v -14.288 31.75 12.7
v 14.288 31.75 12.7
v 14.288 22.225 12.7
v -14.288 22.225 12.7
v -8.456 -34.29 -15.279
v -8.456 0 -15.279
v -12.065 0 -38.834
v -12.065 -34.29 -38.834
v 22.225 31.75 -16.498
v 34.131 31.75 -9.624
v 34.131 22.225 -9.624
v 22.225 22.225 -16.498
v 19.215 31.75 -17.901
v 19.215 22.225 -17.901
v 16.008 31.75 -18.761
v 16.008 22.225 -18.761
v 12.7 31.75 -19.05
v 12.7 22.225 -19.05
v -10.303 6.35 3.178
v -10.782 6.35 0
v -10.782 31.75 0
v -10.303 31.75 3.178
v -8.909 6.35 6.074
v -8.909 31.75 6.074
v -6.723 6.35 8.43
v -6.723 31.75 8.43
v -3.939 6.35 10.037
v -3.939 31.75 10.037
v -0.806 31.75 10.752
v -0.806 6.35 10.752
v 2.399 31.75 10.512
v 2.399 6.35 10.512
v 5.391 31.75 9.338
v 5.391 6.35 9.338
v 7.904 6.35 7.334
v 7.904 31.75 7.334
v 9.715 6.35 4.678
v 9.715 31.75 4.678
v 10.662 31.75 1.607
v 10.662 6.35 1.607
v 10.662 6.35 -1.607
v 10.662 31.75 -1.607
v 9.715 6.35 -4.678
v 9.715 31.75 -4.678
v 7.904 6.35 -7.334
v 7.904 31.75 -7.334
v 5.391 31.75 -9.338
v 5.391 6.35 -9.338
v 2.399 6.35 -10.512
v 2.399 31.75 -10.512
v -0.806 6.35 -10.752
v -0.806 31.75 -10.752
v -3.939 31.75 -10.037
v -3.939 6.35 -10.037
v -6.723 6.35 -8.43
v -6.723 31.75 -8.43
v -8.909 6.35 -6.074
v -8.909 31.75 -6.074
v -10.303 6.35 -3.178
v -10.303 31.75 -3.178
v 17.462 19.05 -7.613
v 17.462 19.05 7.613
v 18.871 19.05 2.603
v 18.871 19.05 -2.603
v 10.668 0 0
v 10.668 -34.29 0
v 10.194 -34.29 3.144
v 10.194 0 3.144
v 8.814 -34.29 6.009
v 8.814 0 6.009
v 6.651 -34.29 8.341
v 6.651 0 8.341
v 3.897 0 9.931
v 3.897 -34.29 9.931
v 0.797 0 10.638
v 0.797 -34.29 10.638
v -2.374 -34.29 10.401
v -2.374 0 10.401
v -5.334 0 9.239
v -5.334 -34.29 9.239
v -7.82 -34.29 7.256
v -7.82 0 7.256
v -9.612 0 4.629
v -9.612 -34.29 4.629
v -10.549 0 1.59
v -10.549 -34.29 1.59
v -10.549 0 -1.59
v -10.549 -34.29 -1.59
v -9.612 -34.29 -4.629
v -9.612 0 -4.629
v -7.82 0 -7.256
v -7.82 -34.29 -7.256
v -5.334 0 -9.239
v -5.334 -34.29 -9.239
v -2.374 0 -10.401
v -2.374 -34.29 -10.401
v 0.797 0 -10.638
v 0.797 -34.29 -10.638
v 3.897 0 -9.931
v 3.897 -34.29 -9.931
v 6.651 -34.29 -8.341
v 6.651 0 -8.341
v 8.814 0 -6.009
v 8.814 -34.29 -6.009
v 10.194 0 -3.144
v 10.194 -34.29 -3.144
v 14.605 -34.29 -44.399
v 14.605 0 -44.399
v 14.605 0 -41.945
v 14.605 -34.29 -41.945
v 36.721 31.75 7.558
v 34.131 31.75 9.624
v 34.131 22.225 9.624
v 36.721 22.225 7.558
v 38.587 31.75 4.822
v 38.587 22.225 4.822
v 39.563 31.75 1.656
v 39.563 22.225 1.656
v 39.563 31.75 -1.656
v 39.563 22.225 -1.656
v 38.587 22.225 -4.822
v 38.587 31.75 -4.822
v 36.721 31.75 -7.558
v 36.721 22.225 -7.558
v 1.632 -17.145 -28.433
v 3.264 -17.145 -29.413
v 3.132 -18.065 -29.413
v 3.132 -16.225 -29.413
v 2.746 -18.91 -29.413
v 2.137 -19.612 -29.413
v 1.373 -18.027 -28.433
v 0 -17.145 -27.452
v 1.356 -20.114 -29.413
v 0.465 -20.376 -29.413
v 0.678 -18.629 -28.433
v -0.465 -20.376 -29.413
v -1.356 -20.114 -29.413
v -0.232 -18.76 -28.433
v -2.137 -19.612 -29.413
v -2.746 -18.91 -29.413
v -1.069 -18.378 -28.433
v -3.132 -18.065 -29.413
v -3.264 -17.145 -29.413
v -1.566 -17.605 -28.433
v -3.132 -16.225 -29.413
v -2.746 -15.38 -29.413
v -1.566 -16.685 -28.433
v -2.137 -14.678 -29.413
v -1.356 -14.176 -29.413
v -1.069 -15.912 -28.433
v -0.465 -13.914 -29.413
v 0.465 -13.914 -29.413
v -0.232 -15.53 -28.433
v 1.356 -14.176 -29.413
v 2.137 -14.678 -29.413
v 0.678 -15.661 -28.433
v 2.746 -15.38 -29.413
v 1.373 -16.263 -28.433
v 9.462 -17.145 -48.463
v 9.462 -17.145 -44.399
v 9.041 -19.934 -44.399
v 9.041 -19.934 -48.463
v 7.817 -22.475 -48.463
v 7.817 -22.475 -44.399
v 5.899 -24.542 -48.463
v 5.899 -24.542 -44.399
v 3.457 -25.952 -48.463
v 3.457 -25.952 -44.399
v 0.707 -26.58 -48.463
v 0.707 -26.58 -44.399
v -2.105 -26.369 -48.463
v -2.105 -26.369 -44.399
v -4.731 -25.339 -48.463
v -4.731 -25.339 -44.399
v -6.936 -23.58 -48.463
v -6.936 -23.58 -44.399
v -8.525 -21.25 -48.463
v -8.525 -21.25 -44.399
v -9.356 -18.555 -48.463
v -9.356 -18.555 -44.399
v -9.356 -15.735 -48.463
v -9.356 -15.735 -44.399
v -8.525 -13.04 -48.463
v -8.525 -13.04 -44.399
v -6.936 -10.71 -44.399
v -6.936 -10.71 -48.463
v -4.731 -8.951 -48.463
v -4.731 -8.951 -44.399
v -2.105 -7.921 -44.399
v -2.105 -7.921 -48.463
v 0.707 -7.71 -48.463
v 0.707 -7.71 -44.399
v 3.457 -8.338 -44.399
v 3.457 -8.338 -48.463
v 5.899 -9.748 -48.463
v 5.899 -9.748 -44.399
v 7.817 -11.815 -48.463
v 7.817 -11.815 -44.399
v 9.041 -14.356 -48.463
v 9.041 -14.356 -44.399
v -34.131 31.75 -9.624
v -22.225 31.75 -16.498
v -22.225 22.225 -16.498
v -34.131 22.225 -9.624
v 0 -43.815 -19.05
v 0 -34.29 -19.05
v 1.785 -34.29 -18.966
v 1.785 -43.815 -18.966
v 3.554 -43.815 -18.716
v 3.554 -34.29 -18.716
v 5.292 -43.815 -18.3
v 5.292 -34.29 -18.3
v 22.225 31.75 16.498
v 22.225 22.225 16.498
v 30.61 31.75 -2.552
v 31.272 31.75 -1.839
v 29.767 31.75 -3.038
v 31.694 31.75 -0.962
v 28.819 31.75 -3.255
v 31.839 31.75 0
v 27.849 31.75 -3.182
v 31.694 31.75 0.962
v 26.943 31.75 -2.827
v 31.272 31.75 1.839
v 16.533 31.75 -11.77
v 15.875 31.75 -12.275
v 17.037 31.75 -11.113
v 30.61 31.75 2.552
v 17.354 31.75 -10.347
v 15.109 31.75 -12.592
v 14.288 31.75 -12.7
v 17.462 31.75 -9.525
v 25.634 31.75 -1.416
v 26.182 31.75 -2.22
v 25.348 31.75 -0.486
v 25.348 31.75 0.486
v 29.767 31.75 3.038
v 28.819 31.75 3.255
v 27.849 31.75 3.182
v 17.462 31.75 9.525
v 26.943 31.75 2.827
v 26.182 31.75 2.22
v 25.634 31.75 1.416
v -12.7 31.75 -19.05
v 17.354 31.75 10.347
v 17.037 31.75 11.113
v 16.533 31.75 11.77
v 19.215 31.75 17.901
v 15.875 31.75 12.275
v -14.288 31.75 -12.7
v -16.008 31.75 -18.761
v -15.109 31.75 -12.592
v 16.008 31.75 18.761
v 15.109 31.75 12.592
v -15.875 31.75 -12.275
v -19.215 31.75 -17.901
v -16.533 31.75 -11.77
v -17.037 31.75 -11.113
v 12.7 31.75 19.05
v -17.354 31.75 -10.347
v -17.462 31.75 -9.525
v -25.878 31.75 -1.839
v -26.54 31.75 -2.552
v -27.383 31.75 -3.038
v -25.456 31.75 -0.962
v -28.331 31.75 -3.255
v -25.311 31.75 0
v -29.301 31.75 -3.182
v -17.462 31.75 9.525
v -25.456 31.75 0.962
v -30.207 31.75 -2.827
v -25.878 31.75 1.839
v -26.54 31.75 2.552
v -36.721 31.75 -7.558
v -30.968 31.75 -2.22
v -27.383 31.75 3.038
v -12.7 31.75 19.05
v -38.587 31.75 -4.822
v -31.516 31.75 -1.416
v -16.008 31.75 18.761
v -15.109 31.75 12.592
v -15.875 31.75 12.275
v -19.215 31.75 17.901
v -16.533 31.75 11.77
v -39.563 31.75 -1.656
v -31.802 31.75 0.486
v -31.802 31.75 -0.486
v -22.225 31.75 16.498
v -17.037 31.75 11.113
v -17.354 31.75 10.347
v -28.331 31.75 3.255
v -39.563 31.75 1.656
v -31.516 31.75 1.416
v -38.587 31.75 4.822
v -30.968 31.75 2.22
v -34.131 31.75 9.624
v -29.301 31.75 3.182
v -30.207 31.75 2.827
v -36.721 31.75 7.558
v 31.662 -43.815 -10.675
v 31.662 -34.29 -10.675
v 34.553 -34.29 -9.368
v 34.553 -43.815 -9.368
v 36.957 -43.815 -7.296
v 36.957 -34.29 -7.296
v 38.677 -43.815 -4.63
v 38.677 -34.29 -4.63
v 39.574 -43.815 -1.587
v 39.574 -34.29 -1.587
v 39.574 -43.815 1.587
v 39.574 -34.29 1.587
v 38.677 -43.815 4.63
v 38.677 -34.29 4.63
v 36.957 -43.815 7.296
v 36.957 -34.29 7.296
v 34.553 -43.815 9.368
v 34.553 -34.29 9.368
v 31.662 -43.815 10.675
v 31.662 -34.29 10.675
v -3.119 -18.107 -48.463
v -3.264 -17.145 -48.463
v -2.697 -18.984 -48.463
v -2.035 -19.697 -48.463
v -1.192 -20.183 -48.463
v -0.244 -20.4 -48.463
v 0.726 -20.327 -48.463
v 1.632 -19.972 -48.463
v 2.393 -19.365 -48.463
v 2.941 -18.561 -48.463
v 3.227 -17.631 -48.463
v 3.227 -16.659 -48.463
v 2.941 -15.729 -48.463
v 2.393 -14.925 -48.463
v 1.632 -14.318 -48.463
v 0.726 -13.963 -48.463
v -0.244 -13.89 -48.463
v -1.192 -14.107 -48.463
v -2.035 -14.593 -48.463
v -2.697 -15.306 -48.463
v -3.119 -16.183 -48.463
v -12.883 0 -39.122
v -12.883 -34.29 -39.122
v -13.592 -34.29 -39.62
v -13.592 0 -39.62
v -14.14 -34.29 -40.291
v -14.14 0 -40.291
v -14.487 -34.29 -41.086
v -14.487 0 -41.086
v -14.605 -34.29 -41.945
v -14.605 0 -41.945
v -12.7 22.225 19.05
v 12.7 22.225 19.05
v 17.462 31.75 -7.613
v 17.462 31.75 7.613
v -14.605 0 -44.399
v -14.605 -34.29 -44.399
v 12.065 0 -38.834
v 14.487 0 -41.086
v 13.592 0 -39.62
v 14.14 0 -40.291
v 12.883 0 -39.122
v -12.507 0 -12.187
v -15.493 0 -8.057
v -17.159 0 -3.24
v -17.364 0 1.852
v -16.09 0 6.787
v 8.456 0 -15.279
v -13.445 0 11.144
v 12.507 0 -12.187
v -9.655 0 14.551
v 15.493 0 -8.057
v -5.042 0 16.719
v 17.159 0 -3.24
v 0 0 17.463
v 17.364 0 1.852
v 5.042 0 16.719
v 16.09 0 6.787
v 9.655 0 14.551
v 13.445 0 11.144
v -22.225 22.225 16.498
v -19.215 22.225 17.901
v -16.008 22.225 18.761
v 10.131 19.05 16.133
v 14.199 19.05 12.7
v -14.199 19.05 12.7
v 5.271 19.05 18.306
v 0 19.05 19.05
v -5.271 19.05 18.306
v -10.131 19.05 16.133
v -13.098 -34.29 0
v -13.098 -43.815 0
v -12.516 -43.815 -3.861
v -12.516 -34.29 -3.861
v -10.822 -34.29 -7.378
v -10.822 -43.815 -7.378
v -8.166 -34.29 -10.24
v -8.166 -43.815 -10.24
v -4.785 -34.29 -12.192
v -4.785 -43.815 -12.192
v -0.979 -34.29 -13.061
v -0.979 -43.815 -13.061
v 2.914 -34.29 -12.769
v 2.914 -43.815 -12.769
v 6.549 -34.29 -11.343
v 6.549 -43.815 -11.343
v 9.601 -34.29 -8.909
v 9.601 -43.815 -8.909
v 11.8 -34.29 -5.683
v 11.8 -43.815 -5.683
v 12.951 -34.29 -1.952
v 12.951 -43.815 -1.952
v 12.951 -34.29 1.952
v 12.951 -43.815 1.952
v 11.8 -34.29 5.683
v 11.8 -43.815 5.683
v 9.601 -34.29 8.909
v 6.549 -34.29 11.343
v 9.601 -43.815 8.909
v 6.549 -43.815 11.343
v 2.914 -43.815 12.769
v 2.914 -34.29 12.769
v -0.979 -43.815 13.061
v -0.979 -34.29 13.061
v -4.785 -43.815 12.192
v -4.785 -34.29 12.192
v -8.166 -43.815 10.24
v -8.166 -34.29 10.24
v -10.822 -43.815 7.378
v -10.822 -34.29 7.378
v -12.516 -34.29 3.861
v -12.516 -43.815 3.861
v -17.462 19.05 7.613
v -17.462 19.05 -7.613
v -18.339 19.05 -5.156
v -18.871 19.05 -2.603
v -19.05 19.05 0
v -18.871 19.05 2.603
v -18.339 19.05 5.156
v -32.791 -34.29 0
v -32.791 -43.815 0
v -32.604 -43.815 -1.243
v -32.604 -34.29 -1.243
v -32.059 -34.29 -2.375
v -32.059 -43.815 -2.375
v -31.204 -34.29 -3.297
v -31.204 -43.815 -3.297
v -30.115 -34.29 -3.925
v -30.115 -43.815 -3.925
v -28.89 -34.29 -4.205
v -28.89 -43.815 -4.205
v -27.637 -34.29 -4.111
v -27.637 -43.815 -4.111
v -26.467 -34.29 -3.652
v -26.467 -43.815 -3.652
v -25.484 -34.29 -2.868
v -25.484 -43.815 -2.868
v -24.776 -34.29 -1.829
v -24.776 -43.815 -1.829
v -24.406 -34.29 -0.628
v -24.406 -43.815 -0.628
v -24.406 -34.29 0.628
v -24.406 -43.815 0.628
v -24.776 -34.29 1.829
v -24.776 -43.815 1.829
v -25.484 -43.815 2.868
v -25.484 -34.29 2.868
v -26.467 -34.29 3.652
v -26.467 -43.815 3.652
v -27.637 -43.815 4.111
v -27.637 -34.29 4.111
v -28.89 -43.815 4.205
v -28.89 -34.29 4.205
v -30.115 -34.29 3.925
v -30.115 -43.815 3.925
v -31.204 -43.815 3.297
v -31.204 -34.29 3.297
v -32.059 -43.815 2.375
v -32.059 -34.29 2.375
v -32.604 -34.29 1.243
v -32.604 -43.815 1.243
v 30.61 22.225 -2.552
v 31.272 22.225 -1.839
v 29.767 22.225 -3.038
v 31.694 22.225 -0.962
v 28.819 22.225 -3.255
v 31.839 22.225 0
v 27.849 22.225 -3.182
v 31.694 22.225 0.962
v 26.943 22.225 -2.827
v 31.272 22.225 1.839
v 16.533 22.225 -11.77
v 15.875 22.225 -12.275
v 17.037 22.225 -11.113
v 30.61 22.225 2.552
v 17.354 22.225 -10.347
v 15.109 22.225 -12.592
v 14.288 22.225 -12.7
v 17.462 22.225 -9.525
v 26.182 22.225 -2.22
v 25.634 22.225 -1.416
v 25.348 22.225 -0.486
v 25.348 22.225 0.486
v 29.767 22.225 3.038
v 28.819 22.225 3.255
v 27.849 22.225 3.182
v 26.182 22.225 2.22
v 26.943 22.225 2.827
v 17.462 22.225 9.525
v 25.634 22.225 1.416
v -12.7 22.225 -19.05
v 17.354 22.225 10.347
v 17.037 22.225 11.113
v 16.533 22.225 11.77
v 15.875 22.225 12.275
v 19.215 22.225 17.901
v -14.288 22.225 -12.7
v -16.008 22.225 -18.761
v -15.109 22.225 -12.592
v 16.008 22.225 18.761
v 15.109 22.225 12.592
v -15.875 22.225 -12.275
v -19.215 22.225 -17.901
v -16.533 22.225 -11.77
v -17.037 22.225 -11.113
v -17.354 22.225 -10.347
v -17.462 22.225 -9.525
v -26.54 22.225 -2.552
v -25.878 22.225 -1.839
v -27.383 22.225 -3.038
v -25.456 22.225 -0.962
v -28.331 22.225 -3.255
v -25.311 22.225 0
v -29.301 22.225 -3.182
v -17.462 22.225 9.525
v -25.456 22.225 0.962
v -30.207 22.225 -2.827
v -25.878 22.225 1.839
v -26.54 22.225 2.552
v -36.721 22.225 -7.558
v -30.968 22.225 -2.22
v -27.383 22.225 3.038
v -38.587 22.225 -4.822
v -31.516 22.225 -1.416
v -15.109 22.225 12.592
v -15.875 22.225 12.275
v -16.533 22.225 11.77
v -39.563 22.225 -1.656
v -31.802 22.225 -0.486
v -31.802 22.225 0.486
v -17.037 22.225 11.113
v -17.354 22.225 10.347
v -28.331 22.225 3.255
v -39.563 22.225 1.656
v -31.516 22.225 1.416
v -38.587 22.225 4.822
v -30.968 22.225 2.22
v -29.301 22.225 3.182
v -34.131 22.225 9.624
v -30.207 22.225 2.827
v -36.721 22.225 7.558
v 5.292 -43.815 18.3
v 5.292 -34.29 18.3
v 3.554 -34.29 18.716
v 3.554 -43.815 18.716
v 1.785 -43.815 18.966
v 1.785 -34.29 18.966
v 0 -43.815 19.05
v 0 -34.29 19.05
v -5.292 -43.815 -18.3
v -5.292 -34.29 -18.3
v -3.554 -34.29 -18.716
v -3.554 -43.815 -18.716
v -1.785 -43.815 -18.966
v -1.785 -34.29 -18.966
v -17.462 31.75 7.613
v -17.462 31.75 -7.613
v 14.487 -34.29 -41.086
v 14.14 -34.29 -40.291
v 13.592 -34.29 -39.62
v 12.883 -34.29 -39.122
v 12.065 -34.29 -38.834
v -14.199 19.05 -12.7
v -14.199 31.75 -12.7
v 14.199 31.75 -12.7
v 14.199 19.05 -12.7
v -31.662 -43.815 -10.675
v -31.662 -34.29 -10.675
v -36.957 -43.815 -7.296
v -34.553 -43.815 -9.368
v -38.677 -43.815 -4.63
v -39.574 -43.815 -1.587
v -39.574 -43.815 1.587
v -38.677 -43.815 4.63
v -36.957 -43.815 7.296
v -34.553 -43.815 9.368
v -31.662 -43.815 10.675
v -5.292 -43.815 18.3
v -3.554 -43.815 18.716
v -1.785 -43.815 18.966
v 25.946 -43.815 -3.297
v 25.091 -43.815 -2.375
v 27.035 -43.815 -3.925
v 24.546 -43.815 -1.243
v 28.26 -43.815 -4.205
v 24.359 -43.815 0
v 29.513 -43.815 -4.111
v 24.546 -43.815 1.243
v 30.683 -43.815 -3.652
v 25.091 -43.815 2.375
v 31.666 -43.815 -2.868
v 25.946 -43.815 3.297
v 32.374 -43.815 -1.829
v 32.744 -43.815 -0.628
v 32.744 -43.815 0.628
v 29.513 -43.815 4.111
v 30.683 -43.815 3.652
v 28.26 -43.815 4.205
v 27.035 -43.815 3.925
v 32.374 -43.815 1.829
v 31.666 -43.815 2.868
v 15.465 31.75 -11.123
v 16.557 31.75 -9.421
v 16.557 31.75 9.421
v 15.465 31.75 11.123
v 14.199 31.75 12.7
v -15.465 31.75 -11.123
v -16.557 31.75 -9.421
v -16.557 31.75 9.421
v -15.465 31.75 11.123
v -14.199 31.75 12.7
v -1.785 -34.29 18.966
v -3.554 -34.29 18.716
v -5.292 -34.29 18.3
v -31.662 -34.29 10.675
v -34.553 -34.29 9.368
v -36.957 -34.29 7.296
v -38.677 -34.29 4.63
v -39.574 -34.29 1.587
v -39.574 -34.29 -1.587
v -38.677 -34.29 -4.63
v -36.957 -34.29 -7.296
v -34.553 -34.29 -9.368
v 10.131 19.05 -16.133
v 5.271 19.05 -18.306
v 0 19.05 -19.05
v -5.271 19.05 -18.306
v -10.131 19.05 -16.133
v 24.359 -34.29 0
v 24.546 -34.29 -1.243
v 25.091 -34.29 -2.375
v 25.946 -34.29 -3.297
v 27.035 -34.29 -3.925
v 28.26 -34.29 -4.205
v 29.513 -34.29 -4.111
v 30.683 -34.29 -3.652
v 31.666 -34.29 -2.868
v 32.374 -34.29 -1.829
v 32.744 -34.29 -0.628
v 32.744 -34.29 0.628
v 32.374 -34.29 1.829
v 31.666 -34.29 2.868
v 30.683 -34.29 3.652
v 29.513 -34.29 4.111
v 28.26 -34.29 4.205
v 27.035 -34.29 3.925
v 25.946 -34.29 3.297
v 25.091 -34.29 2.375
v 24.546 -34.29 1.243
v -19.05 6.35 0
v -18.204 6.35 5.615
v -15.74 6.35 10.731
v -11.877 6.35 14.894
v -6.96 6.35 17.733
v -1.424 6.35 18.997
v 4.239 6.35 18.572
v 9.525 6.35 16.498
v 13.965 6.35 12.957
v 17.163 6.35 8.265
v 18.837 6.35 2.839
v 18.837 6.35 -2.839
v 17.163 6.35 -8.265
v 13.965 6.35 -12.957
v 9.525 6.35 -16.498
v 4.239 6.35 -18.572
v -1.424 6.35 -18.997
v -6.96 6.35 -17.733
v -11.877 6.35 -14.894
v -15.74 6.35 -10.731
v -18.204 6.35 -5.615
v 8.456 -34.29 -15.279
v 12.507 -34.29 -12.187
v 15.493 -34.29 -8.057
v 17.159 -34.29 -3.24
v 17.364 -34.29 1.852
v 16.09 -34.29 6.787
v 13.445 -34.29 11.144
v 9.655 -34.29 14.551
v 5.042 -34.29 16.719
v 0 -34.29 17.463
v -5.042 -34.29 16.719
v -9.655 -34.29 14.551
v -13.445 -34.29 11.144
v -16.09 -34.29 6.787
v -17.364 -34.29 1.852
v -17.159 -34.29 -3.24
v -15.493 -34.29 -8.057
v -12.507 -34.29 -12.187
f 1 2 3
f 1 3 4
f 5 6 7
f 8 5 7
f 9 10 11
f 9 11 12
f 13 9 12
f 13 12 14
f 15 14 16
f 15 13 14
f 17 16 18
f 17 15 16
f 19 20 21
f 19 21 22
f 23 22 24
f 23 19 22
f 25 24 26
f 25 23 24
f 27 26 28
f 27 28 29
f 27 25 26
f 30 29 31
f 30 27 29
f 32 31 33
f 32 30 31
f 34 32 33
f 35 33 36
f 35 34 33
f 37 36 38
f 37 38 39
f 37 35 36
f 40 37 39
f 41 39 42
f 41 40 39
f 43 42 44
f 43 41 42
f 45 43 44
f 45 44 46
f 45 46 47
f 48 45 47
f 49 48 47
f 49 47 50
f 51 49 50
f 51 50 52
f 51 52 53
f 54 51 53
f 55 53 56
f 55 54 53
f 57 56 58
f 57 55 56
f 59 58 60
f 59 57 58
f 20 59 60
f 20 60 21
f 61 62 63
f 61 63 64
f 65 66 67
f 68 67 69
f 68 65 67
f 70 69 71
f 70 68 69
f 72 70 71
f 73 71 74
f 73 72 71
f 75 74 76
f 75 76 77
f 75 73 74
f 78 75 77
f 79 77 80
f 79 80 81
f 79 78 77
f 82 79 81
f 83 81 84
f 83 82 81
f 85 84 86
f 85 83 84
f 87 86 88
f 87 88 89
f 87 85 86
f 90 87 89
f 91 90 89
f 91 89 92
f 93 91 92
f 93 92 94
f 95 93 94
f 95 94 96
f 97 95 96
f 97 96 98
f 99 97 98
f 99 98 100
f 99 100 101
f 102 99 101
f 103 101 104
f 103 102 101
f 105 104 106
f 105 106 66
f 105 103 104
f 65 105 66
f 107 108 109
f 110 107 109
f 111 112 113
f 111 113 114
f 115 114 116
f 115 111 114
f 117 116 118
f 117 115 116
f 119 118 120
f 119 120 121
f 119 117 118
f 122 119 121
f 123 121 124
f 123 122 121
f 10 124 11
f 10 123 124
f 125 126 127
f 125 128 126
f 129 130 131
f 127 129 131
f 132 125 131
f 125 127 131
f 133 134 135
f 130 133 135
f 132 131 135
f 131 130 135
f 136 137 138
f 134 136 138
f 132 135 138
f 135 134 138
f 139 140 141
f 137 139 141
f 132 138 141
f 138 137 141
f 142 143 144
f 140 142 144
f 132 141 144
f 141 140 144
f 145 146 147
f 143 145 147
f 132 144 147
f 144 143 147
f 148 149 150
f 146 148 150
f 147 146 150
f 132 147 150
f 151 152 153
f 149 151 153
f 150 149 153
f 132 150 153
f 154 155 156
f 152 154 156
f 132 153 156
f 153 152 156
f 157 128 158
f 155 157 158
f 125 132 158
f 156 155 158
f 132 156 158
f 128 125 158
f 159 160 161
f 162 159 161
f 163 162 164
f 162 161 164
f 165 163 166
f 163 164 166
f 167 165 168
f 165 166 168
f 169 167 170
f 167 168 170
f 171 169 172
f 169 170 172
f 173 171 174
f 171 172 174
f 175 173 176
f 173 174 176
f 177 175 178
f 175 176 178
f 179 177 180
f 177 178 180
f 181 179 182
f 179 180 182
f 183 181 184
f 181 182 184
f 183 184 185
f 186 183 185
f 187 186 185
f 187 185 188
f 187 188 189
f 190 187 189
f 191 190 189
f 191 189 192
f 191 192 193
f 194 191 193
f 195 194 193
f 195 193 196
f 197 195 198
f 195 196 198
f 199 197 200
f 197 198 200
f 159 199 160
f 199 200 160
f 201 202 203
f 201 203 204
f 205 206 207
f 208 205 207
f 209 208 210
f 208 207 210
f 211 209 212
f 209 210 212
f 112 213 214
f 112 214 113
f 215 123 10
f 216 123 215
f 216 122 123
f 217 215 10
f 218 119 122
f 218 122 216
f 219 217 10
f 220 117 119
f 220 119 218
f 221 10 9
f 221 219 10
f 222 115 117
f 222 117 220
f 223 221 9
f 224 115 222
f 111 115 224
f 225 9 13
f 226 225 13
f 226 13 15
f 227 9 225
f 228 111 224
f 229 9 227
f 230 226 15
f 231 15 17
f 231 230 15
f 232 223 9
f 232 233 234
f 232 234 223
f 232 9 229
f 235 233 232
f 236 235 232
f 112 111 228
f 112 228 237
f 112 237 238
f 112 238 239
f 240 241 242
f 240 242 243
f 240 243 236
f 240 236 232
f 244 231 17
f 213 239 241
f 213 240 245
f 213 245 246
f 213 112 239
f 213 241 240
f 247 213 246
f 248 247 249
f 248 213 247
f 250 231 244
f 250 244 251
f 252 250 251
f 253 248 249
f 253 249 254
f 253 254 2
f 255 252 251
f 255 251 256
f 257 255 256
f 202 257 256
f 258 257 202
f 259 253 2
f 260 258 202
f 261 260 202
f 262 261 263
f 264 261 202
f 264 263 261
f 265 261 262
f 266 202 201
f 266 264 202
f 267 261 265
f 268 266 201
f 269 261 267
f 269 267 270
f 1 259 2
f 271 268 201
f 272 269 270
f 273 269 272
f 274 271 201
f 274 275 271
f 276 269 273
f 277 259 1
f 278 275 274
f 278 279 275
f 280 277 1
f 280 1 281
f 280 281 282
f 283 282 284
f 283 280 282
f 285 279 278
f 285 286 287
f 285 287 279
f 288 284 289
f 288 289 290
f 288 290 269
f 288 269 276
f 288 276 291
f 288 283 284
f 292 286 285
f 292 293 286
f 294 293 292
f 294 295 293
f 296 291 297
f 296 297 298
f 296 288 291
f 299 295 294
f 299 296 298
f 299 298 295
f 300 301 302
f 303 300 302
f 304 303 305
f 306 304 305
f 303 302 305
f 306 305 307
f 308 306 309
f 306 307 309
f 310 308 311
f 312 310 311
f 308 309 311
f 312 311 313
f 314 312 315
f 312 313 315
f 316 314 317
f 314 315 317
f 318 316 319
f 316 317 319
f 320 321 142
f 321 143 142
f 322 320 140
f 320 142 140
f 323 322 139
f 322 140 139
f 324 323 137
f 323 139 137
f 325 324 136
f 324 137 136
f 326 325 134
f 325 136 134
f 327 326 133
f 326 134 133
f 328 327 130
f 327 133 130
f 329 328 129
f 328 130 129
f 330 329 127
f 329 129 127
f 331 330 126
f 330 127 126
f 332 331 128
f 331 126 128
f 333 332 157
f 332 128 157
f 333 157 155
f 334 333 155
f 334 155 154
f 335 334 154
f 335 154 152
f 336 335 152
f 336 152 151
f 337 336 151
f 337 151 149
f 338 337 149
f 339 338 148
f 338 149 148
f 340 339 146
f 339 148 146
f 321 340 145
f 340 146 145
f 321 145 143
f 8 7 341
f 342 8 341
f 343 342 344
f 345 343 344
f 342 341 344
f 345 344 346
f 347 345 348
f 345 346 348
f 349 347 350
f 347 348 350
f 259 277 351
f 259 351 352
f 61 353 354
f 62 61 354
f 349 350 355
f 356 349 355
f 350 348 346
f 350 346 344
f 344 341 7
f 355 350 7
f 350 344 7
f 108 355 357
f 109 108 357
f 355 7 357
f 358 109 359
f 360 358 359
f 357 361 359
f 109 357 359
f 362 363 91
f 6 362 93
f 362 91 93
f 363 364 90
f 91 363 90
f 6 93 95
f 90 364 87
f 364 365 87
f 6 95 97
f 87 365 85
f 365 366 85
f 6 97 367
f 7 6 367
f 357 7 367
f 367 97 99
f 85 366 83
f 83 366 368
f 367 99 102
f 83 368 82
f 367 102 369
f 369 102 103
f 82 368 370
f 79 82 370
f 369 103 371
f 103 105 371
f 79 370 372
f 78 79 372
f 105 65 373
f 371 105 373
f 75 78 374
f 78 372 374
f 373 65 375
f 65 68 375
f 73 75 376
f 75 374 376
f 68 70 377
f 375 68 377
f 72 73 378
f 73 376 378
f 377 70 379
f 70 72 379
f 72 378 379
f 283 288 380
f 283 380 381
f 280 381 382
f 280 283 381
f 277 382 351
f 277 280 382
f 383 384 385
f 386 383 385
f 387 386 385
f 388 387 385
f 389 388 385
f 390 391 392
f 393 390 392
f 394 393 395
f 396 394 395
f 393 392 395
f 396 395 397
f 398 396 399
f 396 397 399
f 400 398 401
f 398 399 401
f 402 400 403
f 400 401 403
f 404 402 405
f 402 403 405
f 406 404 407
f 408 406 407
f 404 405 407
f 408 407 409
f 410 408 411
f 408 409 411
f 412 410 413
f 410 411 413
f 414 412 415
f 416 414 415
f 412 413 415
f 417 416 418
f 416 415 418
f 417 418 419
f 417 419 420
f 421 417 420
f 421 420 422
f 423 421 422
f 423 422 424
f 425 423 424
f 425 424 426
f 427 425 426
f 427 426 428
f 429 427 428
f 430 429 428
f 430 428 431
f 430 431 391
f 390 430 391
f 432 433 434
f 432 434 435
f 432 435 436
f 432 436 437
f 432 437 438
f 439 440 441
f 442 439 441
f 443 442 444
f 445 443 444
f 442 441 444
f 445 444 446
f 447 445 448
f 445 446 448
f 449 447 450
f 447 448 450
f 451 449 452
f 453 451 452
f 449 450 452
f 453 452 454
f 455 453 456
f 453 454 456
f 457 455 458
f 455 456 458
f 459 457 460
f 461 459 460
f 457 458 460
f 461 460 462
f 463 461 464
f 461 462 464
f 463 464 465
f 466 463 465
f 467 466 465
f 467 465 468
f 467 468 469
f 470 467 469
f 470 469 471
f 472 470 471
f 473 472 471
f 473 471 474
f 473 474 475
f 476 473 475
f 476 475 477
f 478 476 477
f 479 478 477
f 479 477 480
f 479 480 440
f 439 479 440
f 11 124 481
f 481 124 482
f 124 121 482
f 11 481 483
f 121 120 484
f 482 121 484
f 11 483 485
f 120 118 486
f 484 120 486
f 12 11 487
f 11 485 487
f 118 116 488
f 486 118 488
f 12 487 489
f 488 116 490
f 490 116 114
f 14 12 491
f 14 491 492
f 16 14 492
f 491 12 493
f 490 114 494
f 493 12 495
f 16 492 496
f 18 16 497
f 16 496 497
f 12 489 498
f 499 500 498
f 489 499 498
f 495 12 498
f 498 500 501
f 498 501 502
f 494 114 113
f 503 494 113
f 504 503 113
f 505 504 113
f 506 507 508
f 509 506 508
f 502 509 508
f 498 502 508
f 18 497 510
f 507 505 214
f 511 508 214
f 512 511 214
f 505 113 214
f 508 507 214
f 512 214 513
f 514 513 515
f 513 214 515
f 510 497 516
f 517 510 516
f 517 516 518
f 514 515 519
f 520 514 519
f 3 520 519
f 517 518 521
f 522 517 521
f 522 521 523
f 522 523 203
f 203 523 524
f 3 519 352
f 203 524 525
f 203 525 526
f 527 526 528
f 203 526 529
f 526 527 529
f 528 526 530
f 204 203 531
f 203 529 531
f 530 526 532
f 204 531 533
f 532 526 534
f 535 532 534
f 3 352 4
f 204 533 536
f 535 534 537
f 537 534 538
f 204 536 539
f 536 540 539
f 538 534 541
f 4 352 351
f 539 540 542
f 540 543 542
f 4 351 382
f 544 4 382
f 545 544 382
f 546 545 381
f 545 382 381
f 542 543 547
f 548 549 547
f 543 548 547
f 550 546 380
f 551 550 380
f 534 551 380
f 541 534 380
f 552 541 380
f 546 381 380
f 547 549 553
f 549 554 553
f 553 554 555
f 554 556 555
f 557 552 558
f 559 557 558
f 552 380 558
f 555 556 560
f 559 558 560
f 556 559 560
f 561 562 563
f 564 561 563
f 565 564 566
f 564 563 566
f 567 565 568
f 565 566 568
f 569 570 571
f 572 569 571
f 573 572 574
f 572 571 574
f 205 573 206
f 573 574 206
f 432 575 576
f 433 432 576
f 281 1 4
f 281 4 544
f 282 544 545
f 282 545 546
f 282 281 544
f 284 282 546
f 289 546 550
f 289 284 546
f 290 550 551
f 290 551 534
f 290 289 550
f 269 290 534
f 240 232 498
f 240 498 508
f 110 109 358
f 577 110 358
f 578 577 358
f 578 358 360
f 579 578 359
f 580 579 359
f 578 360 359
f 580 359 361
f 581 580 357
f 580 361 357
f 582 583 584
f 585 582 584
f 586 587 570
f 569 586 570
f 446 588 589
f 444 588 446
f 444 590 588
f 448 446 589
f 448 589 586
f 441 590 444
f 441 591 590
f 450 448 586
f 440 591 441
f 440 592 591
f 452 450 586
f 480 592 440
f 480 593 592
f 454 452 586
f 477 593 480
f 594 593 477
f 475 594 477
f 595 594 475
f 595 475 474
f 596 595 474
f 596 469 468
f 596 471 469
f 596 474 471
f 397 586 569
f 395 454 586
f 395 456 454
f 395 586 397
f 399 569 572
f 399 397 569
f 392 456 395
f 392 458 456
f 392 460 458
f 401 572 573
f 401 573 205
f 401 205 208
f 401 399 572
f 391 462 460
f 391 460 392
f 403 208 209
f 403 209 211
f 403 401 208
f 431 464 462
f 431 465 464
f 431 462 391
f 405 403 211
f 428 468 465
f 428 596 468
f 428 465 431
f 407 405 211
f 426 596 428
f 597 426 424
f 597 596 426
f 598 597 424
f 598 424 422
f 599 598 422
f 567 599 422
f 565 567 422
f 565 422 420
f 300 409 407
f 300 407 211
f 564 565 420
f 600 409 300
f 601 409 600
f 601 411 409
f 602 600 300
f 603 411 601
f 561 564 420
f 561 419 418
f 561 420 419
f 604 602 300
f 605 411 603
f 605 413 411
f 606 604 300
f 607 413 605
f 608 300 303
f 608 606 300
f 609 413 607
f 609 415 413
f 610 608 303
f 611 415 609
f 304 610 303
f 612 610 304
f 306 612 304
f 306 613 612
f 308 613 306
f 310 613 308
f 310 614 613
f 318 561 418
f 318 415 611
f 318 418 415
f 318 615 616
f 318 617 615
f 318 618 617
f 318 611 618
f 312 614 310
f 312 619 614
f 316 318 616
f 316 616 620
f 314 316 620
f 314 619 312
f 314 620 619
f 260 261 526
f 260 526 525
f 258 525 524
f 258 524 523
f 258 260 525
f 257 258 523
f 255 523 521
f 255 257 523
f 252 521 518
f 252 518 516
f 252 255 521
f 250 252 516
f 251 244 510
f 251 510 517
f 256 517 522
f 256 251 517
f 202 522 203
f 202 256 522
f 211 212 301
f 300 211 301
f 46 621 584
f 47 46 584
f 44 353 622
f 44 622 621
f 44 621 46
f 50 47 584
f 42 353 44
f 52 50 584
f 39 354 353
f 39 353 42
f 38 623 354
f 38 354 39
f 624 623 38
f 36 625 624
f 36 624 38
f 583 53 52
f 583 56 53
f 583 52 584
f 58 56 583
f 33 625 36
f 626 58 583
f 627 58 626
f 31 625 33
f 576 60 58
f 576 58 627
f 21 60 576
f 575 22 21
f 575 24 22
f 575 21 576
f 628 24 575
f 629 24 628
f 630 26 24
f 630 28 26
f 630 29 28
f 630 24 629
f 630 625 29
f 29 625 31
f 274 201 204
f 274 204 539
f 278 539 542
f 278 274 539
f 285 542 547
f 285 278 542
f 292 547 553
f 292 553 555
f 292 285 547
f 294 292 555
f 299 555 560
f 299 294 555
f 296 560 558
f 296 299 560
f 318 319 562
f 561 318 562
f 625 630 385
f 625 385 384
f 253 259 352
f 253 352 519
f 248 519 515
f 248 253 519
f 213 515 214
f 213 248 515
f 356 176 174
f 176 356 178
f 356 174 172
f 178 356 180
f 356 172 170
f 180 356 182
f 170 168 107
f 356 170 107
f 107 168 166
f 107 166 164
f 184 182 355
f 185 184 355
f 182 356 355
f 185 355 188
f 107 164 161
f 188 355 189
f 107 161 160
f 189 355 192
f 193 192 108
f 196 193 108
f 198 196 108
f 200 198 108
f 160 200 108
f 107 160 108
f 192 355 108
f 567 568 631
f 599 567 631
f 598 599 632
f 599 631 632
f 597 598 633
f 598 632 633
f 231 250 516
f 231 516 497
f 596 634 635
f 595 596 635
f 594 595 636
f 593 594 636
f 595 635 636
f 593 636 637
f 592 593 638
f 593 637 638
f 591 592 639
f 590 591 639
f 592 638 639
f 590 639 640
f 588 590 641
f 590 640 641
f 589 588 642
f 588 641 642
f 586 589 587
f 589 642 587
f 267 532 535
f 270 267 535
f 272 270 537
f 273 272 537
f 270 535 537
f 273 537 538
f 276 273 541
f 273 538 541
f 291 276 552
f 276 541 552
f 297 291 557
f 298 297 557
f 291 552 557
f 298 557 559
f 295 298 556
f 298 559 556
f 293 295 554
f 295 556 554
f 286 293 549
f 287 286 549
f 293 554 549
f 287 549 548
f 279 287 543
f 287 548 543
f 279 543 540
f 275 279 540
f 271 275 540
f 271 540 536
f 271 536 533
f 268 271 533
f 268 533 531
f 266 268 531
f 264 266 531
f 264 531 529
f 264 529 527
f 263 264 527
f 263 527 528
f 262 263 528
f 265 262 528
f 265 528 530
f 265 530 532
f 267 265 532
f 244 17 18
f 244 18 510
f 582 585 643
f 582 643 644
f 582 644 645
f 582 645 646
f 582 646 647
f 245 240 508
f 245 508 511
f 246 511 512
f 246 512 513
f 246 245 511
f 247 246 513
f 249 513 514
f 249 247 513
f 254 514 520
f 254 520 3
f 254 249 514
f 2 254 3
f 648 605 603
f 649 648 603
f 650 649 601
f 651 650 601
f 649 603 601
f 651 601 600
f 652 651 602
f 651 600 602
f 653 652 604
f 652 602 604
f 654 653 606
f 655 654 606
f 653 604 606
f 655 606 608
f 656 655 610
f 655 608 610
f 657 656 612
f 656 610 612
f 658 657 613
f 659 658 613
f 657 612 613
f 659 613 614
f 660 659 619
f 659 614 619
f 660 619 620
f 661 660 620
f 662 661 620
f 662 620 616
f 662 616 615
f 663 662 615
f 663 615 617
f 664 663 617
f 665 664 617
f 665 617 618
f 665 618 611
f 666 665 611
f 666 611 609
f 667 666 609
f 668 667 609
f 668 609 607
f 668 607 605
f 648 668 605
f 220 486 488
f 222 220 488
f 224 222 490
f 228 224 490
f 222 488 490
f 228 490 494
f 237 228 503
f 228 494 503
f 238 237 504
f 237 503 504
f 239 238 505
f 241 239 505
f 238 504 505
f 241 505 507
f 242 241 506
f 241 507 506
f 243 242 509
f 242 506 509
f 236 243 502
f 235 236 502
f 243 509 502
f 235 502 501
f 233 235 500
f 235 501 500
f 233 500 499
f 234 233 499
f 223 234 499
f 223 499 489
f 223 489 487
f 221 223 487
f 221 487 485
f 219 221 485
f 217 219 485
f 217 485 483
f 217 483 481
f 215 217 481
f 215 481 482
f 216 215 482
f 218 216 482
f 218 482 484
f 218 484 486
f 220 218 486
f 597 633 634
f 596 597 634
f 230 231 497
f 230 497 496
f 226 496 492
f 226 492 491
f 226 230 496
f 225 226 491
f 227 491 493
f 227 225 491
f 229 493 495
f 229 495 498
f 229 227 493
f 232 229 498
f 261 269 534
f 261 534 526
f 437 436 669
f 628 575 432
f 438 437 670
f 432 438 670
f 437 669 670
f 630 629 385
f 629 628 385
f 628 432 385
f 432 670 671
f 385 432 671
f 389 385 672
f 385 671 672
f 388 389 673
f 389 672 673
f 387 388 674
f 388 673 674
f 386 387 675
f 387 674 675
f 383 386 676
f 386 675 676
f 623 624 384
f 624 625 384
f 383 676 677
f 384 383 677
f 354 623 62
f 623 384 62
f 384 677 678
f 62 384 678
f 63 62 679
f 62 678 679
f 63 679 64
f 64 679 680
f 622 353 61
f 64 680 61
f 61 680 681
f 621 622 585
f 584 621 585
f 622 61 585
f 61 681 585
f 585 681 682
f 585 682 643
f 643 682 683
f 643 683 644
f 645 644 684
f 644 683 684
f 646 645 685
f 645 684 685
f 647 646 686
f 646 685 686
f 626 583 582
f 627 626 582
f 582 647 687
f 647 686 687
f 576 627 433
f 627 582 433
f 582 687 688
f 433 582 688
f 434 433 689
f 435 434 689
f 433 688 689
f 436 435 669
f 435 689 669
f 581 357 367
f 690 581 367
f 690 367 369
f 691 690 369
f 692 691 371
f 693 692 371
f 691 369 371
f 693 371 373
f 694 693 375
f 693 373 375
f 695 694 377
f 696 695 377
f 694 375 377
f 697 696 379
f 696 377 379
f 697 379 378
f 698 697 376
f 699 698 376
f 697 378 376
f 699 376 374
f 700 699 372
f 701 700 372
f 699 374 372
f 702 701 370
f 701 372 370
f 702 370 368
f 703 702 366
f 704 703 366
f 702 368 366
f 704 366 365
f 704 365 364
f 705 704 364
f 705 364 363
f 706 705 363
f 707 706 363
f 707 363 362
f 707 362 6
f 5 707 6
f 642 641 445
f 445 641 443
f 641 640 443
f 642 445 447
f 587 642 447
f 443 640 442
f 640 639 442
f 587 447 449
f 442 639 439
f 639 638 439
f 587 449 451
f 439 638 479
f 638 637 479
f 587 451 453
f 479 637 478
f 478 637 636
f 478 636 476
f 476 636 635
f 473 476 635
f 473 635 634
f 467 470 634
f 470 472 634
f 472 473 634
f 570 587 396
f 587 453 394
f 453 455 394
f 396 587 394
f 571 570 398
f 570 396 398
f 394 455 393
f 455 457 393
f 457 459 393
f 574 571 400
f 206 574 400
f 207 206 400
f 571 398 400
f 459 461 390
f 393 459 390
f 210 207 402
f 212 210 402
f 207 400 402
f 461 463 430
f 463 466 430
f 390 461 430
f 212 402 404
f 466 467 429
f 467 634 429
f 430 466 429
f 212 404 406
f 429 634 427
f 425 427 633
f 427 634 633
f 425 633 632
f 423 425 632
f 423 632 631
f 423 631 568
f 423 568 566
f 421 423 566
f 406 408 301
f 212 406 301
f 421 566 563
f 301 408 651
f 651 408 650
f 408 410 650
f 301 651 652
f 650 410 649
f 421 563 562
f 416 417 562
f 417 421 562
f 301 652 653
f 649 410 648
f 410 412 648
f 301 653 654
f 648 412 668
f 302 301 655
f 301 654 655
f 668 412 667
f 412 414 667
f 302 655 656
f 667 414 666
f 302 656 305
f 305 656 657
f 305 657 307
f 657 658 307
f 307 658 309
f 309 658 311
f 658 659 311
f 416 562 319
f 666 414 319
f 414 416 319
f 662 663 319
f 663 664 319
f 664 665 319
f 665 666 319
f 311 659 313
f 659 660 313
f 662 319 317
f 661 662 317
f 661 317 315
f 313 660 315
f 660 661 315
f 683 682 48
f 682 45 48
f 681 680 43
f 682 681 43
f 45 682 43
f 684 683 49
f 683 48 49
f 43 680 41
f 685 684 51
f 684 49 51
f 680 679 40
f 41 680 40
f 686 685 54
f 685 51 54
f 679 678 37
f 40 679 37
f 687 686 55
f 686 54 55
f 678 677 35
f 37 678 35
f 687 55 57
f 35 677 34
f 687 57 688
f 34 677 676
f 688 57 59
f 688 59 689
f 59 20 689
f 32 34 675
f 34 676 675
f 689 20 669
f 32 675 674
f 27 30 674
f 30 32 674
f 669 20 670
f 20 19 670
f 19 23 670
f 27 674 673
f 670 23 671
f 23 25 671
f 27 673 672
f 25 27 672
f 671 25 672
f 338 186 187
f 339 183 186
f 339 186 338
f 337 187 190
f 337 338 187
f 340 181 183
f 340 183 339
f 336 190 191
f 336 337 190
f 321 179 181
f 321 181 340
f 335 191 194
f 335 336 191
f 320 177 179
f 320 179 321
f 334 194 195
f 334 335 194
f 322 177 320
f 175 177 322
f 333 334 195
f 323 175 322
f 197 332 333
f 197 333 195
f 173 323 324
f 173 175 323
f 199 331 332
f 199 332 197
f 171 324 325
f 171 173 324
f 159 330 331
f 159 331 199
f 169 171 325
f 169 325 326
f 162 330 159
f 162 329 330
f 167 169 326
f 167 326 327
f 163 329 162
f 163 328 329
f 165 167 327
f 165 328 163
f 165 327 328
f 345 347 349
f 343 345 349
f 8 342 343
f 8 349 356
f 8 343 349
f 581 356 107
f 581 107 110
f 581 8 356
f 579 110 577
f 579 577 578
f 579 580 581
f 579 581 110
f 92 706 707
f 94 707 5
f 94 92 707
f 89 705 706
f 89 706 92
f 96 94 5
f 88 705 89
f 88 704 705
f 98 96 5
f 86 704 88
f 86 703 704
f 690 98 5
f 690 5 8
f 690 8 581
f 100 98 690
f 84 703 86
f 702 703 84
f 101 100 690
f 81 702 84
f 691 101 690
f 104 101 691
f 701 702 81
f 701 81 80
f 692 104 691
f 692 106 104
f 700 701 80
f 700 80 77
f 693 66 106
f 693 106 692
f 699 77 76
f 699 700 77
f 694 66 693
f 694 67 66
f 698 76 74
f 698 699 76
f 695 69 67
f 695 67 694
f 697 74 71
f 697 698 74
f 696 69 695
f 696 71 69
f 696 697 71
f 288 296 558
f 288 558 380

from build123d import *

# Parameters (mm, degrees)
F0_R      = 10.668
F1_DEPTH  = 34.29
F2_R      = 9.4615
F3_DEPTH  = 4.064
F5_D      = 6.5278
F5_DEPTH  = 19.05
F5_TIP    = 1.9611489744
F7_DEPTH  = 9.525
F8_D      = 26.19502
F9_D      = 8.4328
F11_R     = 19.05
F11_R_2   = 10.7823
F12_DEPTH = 25.4
F14_DEPTH = 12.7
F16_DEPTH = 9.525
F17_D     = 6.5278


# Not quite as in the source:
# - a pattern or mirror of a feature is missing from the dataset's text; its kind, count and spacing are read off the source's solid


with BuildPart() as f1:
    # F0 (on Front) → F1 (new body)
    with BuildSketch(Plane.XZ):
        with BuildLine():
            Line((12.065, -38.8341331818), (8.4555263158, -15.2788409565))
            ThreePointArc((8.4555263158, -15.2788409565), (0, 17.4625), (-8.4555263158, -15.2788409565))
            Line((-8.4555263158, -15.2788409565), (-12.065, -38.8341331818))
            ThreePointArc((-12.065, -38.8341331818), (-13.8893444248, -39.9369388409), (-14.605, -41.9449851551))
            Line((-14.605, -41.9449851551), (-14.605, -44.3992))
            Line((-14.605, -44.3992), (14.605, -44.3992))
            Line((14.605, -44.3992), (14.605, -41.9449851551))
            ThreePointArc((14.605, -41.9449851551), (13.8893444248, -39.9369388409), (12.065, -38.8341331818))
        make_face()
        Circle(F0_R, mode=Mode.SUBTRACT)
    extrude(amount=F1_DEPTH)

    # F2 (on face) → F3 (join)
    with BuildSketch(Plane(origin=(0, 0, -44.3992), x_dir=(1, 0, 0), z_dir=(0, 0, -1))):
        with Locations((0, 17.145)):
            Circle(F2_R)
    extrude(amount=F3_DEPTH)

    # F5
    with Locations(Plane(origin=(0, 0, -48.4632), x_dir=(1, 0, 0), z_dir=(0, 0, -1))):
        with Locations((0, 17.145)):
            Hole(F5_D / 2, depth=F5_DEPTH)
            with Locations((0, 0, -(F5_DEPTH + F5_TIP / 2))):  # 118° drill point
                Cone(0, F5_D / 2, F5_TIP, mode=Mode.SUBTRACT)


with BuildPart() as f7:
    # F6 (on face) → F7 (new body)
    with BuildSketch(Plane.XZ.offset(34.29)):
        with BuildLine():
            Line((5.2916666667, -18.300294093), (31.6618055556, -10.6751715542))
            ThreePointArc((31.6618055556, -10.6751715542), (39.6875, 0), (31.6618055556, 10.6751715542))
            Line((31.6618055556, 10.6751715542), (5.2916666667, 18.300294093))
            ThreePointArc((5.2916666667, 18.300294093), (2.6722553704, 18.861642326), (0, 19.05))
            ThreePointArc((0, 19.05), (-2.6722553704, 18.861642326), (-5.2916666667, 18.300294093))
            Line((-5.2916666667, 18.300294093), (-31.6618055556, 10.6751715542))
            ThreePointArc((-31.6618055556, 10.6751715542), (-39.6875, 0), (-31.6618055556, -10.6751715542))
            Line((-31.6618055556, -10.6751715542), (-5.2916666667, -18.300294093))
            ThreePointArc((-5.2916666667, -18.300294093), (-2.6722553704, -18.861642326), (0, -19.05))
            ThreePointArc((0, -19.05), (2.6722553704, -18.861642326), (5.2916666667, -18.300294093))
        make_face()
    extrude(amount=F7_DEPTH)

    # F8 (through all)
    with Locations(Plane(origin=(0, -34.29, 0), x_dir=(1, 0, 0), z_dir=(0, 1, 0))):
        with Locations((0, 0)):
            Hole(F8_D / 2)

    # F9 (through all)
    with Locations(Plane(origin=(0, -34.29, 0), x_dir=(1, 0, 0), z_dir=(0, 1, 0))):
        with Locations((28.575, 0), (-28.575, 0)):
            Hole(F9_D / 2)


with BuildPart() as f12:
    # F11 (on offset) → F12 (new body)
    with BuildSketch(Plane(origin=(0, 6.35, 0), x_dir=(-1, 0, 0), z_dir=(0, 1, 0))):
        Circle(F11_R)
        Circle(F11_R_2, mode=Mode.SUBTRACT)
    extrude(amount=F12_DEPTH)

    # F13 (on face) → F14 (cut)
    with BuildSketch(Plane(origin=(0, 31.75, 0), x_dir=(-1, 0, 0), z_dir=(0, 1, 0))):
        with BuildLine():
            Line((17.4625, 12.7), (14.1990316571, 12.7))
            ThreePointArc((14.1990316571, 12.7), (16.0337633139, 10.2869302512), (17.4625, 7.6133825433))
            Line((17.4625, 7.6133825433), (17.4625, 12.7))
        make_face()
        with BuildLine():
            Line((14.1990316571, -12.7), (-14.1990316571, -12.7))
            ThreePointArc((-14.1990316571, -12.7), (0, -19.05), (14.1990316571, -12.7))
        make_face()
        with BuildLine():
            Line((-17.4625, -7.6133825433), (-17.4625, 7.6133825433))
            ThreePointArc((-17.4625, 7.6133825433), (-19.05, 0), (-17.4625, -7.6133825433))
        make_face()
        with BuildLine():
            ThreePointArc((19.05, 0), (18.6489024476, 3.8885649667), (17.4625, 7.6133825433))
            Line((17.4625, 7.6133825433), (17.4625, -7.6133825433))
            ThreePointArc((17.4625, -7.6133825433), (18.6489024476, -3.8885649667), (19.05, 0))
        make_face()
    f14 = extrude(amount=-F14_DEPTH, mode=Mode.SUBTRACT)

    # F14_copies: F14 across plane
    add(f14.mirror(Plane.XY), mode=Mode.SUBTRACT)


with BuildPart() as f16:
    # F15 (on face) → F16 (new body)
    with BuildSketch(Plane(origin=(0, 31.75, 0), x_dir=(-1, 0, 0), z_dir=(0, 1, 0))):
        with BuildLine():
            Line((22.225, -16.4977839421), (34.13125, -9.6237072996))
            ThreePointArc((34.13125, -9.6237072996), (39.6875, 0), (34.13125, 9.6237072996))
            Line((34.13125, 9.6237072996), (22.225, 16.4977839421))
            ThreePointArc((22.225, 16.4977839421), (17.6305028092, 18.4008869908), (12.7, 19.05))
            Line((12.7, 19.05), (-12.7, 19.05))
            ThreePointArc((-12.7, 19.05), (-17.6305028092, 18.4008869908), (-22.225, 16.4977839421))
            Line((-22.225, 16.4977839421), (-34.13125, 9.6237072996))
            ThreePointArc((-34.13125, 9.6237072996), (-39.6875, 0), (-34.13125, -9.6237072996))
            Line((-34.13125, -9.6237072996), (-22.225, -16.4977839421))
            ThreePointArc((-22.225, -16.4977839421), (-17.6305028092, -18.4008869908), (-12.7, -19.05))
            Line((-12.7, -19.05), (12.7, -19.05))
            ThreePointArc((12.7, -19.05), (17.6305028092, -18.4008869908), (22.225, -16.4977839421))
        make_face()
        with BuildLine():
            ThreePointArc((-17.4625, 9.525), (-16.5325640303, 11.7700640303), (-14.2875, 12.7))
            Line((-14.2875, 12.7), (14.2875, 12.7))
            ThreePointArc((14.2875, 12.7), (16.5325640303, 11.7700640303), (17.4625, 9.525))
            Line((17.4625, 9.525), (17.4625, -9.525))
            ThreePointArc((17.4625, -9.525), (16.5325640303, -11.7700640303), (14.2875, -12.7))
            Line((14.2875, -12.7), (-14.2875, -12.7))
            ThreePointArc((-14.2875, -12.7), (-16.5325640303, -11.7700640303), (-17.4625, -9.525))
            Line((-17.4625, -9.525), (-17.4625, 9.525))
        make_face(mode=Mode.SUBTRACT)
    extrude(amount=-F16_DEPTH)

    # F17 (through all)
    with Locations(Plane(origin=(0, 31.75, 0), x_dir=(-1, 0, 0), z_dir=(0, 1, 0))):
        with Locations((-28.575, 0), (28.575, 0)):
            Hole(F17_D / 2)


solid = Compound([f1.part, f7.part, f12.part, f16.part])
